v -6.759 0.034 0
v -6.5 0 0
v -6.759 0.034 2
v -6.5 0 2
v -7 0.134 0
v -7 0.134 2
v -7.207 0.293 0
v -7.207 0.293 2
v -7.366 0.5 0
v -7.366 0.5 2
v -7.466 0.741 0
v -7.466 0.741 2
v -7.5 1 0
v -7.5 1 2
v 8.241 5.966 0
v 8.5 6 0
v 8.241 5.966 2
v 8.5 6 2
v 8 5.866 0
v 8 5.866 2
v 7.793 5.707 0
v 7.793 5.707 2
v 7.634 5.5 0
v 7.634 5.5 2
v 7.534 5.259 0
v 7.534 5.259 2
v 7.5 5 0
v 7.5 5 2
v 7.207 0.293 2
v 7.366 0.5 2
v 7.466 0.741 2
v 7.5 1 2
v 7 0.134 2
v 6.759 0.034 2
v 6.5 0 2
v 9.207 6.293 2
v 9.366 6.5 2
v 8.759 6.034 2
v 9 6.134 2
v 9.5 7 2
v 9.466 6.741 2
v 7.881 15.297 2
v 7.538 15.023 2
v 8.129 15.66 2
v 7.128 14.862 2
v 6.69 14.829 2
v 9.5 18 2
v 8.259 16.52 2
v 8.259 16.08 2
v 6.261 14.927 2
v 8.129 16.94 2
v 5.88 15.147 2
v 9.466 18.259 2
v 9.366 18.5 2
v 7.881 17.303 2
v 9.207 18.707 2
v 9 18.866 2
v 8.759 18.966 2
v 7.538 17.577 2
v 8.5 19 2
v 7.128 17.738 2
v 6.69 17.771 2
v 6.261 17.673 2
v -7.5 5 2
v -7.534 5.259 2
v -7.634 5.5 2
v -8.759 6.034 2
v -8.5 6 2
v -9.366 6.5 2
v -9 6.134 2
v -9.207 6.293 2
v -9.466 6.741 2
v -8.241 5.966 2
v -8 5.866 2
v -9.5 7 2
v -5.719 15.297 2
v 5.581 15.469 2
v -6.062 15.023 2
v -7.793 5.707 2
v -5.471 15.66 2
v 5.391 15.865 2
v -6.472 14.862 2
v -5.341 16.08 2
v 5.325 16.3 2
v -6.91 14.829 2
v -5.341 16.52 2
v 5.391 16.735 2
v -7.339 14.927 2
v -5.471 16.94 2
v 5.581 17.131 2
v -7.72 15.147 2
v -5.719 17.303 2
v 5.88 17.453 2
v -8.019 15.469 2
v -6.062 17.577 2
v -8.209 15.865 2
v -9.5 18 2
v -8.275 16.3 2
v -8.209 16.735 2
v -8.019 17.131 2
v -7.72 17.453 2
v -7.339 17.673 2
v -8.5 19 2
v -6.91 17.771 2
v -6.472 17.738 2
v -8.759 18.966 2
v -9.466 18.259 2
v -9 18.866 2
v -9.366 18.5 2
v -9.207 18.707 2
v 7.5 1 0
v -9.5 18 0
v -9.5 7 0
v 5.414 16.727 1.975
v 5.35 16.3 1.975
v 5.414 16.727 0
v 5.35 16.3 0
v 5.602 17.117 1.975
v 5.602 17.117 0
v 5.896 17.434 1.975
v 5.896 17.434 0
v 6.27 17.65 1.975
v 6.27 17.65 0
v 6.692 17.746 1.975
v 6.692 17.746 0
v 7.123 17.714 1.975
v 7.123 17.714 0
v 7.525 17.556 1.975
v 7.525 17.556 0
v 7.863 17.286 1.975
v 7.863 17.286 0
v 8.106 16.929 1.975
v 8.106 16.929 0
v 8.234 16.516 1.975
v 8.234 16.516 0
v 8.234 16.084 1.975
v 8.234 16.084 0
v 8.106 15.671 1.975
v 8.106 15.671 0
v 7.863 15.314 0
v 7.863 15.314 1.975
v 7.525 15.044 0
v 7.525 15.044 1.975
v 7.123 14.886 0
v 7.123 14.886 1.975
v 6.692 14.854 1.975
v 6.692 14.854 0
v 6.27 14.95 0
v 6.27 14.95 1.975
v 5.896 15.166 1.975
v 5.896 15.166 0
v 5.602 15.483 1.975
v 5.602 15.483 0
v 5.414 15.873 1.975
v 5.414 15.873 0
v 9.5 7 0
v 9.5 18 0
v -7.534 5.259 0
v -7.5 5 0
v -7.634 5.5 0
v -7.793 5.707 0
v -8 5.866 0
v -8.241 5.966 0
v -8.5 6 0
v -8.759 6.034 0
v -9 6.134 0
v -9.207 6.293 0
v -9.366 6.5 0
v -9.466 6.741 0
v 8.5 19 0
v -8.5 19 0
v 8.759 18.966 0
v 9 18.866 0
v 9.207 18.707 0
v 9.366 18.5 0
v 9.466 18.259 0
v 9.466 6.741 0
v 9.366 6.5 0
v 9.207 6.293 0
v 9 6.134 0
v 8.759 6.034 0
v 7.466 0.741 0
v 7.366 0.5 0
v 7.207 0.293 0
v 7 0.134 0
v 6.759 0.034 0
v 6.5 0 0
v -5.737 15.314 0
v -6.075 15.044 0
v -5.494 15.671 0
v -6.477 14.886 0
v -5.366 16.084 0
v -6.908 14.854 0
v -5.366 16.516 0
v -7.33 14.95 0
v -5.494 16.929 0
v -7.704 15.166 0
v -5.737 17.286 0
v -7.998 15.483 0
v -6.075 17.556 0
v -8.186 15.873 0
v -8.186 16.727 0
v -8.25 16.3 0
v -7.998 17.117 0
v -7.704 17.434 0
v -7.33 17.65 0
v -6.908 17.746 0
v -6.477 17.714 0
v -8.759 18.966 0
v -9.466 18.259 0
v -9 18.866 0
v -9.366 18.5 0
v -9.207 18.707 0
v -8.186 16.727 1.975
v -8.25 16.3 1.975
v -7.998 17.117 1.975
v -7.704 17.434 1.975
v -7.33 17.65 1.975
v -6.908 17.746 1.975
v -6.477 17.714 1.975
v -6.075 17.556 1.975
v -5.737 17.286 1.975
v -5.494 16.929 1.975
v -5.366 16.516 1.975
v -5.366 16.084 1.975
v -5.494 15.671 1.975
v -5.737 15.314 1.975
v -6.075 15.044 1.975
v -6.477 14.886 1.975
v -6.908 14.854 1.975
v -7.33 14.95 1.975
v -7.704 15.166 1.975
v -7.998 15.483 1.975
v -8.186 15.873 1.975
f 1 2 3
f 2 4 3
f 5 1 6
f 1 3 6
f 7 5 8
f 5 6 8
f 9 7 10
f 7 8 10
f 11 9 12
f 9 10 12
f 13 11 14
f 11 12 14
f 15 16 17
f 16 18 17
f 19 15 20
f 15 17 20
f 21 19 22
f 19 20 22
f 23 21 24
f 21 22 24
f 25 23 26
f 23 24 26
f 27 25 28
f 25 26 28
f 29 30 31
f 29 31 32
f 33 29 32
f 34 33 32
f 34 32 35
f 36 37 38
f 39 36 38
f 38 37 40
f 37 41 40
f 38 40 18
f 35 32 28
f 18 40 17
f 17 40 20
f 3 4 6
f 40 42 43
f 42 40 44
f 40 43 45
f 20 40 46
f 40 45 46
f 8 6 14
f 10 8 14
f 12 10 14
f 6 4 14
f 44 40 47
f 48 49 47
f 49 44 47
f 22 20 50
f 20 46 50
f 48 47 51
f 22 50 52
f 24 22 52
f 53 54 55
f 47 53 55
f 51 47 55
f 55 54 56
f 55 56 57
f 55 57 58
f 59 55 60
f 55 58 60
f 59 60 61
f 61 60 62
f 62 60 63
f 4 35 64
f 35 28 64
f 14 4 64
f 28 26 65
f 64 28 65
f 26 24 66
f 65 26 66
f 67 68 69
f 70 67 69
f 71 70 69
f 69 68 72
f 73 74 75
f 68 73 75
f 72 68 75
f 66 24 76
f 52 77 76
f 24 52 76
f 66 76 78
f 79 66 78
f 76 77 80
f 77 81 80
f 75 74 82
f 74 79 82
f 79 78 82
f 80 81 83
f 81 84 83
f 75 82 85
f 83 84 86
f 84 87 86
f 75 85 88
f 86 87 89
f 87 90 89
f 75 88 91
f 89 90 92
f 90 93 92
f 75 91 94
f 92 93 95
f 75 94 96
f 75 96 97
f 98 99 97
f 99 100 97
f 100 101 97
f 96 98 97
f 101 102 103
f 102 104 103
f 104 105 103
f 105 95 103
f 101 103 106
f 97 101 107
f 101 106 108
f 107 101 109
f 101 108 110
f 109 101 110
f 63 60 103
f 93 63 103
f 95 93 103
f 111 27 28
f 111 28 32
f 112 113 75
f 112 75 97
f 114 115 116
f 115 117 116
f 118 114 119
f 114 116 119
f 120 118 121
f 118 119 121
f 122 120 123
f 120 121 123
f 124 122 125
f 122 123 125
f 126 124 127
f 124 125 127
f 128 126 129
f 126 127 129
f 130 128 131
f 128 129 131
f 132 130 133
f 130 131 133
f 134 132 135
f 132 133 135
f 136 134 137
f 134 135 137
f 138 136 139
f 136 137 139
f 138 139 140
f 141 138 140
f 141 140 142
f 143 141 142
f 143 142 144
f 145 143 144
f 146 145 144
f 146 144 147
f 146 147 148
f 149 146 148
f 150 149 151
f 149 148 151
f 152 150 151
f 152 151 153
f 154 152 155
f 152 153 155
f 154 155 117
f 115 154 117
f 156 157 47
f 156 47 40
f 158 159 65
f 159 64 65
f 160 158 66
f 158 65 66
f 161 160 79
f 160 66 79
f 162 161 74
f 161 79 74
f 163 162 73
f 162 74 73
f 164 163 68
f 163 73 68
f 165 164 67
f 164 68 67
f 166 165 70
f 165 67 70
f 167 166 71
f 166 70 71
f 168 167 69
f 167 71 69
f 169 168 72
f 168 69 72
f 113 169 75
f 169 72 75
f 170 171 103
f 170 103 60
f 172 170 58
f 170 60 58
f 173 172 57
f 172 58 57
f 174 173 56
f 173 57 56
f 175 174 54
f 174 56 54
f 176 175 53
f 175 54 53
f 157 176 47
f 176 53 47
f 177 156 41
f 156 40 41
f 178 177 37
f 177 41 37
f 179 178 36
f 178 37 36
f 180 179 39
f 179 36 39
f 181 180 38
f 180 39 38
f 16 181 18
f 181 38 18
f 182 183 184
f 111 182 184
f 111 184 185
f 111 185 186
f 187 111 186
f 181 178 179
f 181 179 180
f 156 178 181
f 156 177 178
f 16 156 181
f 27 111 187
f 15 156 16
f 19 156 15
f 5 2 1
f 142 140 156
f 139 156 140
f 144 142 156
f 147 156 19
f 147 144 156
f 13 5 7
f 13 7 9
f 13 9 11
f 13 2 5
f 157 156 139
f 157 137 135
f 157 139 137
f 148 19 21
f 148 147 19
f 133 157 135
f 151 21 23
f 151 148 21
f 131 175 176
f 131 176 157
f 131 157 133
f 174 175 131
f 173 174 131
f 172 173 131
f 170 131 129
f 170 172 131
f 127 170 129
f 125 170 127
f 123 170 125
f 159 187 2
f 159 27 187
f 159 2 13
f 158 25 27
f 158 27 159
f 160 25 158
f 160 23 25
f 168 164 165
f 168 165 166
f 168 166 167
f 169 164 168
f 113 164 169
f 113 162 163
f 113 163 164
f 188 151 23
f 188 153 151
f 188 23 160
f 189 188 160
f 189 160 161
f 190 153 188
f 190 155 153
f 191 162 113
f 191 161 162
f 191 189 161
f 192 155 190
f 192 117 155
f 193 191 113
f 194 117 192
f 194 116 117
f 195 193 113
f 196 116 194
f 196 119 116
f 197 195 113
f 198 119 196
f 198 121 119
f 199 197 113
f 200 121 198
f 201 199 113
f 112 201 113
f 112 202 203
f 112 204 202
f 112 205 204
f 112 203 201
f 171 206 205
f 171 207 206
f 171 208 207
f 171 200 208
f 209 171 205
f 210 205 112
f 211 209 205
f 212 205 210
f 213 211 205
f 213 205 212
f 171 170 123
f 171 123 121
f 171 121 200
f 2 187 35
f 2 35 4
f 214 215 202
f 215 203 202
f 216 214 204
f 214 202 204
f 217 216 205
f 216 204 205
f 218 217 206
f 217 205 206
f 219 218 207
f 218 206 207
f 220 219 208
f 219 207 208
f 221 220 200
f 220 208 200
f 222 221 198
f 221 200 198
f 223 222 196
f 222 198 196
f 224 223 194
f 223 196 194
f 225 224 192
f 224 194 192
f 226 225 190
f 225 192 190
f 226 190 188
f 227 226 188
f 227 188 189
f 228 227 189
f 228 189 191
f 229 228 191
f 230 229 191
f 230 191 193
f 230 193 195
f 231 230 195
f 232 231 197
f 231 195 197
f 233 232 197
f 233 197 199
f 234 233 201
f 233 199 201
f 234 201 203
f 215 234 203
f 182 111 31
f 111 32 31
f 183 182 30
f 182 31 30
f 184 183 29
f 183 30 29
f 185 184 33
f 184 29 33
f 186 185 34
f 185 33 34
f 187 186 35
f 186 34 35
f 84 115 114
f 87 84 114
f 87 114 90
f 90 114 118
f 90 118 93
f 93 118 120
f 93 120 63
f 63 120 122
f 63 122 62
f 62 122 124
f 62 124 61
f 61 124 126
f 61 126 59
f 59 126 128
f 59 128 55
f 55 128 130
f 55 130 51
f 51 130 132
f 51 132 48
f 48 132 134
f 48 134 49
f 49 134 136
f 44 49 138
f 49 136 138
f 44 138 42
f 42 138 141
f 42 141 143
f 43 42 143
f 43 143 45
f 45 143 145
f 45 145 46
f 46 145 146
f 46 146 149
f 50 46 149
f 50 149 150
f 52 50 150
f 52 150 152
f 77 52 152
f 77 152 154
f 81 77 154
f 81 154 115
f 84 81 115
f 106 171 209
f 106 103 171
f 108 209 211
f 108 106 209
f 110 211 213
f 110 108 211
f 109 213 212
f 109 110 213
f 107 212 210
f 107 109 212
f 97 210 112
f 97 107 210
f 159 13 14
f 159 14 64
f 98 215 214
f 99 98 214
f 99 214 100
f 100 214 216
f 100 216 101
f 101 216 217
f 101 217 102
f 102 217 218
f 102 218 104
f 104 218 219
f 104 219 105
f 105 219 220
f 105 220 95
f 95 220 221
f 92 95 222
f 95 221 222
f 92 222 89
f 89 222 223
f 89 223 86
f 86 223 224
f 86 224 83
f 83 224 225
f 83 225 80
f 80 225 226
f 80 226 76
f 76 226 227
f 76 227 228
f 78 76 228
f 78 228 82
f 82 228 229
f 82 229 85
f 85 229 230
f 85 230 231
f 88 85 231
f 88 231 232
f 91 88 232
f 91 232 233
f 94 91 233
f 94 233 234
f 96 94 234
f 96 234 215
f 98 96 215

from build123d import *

# Parameters (mm, degrees)
BOSS_EXTRU_1_DEPTH           = 2
CONG_3_R                     = 1
D_GAGEMENT_M2_51_D           = 2.9
D_GAGEMENT_M2_51_CSINK_D     = 2.95
D_GAGEMENT_M2_51_CSINK_ANGLE = 90


with BuildPart() as part:
    # Esquisse1 → Boss.-Extru.1 (new body)
    with BuildSketch(Plane.XY):
        Polygon((-9.5, 19), (9.5, 19), (9.5, 6), (7.5, 6), (7.5, 0), (-7.5, 0), (-7.5, 6), (-9.5, 6), align=None)
    extrude(amount=BOSS_EXTRU_1_DEPTH)

    # Congé3
    cong_3_edges = [part.edges().sort_by_distance(p)[0] for p in [
        (9.5, 19, 1),
        (9.5, 6, 1),
        (7.5, 6, 1),
        (7.5, 0, 1),
        (-7.5, 0, 1),
        (-7.5, 6, 1),
        (-9.5, 6, 1),
        (-9.5, 19, 1),
    ]]
    fillet(cong_3_edges, radius=CONG_3_R - 0.0001)  # a hair under: the kernel refuses the full size

    # Dégagement M2.51 (through all)
    with Locations(Plane(origin=(-6.8, 16.3, 2), x_dir=(1, 0, 0), z_dir=(0, 0, 1))):
        with Locations((0, 0), (13.6, 0)):
            CounterSinkHole(D_GAGEMENT_M2_51_D / 2, D_GAGEMENT_M2_51_CSINK_D / 2, counter_sink_angle=D_GAGEMENT_M2_51_CSINK_ANGLE)


solid = part.part
